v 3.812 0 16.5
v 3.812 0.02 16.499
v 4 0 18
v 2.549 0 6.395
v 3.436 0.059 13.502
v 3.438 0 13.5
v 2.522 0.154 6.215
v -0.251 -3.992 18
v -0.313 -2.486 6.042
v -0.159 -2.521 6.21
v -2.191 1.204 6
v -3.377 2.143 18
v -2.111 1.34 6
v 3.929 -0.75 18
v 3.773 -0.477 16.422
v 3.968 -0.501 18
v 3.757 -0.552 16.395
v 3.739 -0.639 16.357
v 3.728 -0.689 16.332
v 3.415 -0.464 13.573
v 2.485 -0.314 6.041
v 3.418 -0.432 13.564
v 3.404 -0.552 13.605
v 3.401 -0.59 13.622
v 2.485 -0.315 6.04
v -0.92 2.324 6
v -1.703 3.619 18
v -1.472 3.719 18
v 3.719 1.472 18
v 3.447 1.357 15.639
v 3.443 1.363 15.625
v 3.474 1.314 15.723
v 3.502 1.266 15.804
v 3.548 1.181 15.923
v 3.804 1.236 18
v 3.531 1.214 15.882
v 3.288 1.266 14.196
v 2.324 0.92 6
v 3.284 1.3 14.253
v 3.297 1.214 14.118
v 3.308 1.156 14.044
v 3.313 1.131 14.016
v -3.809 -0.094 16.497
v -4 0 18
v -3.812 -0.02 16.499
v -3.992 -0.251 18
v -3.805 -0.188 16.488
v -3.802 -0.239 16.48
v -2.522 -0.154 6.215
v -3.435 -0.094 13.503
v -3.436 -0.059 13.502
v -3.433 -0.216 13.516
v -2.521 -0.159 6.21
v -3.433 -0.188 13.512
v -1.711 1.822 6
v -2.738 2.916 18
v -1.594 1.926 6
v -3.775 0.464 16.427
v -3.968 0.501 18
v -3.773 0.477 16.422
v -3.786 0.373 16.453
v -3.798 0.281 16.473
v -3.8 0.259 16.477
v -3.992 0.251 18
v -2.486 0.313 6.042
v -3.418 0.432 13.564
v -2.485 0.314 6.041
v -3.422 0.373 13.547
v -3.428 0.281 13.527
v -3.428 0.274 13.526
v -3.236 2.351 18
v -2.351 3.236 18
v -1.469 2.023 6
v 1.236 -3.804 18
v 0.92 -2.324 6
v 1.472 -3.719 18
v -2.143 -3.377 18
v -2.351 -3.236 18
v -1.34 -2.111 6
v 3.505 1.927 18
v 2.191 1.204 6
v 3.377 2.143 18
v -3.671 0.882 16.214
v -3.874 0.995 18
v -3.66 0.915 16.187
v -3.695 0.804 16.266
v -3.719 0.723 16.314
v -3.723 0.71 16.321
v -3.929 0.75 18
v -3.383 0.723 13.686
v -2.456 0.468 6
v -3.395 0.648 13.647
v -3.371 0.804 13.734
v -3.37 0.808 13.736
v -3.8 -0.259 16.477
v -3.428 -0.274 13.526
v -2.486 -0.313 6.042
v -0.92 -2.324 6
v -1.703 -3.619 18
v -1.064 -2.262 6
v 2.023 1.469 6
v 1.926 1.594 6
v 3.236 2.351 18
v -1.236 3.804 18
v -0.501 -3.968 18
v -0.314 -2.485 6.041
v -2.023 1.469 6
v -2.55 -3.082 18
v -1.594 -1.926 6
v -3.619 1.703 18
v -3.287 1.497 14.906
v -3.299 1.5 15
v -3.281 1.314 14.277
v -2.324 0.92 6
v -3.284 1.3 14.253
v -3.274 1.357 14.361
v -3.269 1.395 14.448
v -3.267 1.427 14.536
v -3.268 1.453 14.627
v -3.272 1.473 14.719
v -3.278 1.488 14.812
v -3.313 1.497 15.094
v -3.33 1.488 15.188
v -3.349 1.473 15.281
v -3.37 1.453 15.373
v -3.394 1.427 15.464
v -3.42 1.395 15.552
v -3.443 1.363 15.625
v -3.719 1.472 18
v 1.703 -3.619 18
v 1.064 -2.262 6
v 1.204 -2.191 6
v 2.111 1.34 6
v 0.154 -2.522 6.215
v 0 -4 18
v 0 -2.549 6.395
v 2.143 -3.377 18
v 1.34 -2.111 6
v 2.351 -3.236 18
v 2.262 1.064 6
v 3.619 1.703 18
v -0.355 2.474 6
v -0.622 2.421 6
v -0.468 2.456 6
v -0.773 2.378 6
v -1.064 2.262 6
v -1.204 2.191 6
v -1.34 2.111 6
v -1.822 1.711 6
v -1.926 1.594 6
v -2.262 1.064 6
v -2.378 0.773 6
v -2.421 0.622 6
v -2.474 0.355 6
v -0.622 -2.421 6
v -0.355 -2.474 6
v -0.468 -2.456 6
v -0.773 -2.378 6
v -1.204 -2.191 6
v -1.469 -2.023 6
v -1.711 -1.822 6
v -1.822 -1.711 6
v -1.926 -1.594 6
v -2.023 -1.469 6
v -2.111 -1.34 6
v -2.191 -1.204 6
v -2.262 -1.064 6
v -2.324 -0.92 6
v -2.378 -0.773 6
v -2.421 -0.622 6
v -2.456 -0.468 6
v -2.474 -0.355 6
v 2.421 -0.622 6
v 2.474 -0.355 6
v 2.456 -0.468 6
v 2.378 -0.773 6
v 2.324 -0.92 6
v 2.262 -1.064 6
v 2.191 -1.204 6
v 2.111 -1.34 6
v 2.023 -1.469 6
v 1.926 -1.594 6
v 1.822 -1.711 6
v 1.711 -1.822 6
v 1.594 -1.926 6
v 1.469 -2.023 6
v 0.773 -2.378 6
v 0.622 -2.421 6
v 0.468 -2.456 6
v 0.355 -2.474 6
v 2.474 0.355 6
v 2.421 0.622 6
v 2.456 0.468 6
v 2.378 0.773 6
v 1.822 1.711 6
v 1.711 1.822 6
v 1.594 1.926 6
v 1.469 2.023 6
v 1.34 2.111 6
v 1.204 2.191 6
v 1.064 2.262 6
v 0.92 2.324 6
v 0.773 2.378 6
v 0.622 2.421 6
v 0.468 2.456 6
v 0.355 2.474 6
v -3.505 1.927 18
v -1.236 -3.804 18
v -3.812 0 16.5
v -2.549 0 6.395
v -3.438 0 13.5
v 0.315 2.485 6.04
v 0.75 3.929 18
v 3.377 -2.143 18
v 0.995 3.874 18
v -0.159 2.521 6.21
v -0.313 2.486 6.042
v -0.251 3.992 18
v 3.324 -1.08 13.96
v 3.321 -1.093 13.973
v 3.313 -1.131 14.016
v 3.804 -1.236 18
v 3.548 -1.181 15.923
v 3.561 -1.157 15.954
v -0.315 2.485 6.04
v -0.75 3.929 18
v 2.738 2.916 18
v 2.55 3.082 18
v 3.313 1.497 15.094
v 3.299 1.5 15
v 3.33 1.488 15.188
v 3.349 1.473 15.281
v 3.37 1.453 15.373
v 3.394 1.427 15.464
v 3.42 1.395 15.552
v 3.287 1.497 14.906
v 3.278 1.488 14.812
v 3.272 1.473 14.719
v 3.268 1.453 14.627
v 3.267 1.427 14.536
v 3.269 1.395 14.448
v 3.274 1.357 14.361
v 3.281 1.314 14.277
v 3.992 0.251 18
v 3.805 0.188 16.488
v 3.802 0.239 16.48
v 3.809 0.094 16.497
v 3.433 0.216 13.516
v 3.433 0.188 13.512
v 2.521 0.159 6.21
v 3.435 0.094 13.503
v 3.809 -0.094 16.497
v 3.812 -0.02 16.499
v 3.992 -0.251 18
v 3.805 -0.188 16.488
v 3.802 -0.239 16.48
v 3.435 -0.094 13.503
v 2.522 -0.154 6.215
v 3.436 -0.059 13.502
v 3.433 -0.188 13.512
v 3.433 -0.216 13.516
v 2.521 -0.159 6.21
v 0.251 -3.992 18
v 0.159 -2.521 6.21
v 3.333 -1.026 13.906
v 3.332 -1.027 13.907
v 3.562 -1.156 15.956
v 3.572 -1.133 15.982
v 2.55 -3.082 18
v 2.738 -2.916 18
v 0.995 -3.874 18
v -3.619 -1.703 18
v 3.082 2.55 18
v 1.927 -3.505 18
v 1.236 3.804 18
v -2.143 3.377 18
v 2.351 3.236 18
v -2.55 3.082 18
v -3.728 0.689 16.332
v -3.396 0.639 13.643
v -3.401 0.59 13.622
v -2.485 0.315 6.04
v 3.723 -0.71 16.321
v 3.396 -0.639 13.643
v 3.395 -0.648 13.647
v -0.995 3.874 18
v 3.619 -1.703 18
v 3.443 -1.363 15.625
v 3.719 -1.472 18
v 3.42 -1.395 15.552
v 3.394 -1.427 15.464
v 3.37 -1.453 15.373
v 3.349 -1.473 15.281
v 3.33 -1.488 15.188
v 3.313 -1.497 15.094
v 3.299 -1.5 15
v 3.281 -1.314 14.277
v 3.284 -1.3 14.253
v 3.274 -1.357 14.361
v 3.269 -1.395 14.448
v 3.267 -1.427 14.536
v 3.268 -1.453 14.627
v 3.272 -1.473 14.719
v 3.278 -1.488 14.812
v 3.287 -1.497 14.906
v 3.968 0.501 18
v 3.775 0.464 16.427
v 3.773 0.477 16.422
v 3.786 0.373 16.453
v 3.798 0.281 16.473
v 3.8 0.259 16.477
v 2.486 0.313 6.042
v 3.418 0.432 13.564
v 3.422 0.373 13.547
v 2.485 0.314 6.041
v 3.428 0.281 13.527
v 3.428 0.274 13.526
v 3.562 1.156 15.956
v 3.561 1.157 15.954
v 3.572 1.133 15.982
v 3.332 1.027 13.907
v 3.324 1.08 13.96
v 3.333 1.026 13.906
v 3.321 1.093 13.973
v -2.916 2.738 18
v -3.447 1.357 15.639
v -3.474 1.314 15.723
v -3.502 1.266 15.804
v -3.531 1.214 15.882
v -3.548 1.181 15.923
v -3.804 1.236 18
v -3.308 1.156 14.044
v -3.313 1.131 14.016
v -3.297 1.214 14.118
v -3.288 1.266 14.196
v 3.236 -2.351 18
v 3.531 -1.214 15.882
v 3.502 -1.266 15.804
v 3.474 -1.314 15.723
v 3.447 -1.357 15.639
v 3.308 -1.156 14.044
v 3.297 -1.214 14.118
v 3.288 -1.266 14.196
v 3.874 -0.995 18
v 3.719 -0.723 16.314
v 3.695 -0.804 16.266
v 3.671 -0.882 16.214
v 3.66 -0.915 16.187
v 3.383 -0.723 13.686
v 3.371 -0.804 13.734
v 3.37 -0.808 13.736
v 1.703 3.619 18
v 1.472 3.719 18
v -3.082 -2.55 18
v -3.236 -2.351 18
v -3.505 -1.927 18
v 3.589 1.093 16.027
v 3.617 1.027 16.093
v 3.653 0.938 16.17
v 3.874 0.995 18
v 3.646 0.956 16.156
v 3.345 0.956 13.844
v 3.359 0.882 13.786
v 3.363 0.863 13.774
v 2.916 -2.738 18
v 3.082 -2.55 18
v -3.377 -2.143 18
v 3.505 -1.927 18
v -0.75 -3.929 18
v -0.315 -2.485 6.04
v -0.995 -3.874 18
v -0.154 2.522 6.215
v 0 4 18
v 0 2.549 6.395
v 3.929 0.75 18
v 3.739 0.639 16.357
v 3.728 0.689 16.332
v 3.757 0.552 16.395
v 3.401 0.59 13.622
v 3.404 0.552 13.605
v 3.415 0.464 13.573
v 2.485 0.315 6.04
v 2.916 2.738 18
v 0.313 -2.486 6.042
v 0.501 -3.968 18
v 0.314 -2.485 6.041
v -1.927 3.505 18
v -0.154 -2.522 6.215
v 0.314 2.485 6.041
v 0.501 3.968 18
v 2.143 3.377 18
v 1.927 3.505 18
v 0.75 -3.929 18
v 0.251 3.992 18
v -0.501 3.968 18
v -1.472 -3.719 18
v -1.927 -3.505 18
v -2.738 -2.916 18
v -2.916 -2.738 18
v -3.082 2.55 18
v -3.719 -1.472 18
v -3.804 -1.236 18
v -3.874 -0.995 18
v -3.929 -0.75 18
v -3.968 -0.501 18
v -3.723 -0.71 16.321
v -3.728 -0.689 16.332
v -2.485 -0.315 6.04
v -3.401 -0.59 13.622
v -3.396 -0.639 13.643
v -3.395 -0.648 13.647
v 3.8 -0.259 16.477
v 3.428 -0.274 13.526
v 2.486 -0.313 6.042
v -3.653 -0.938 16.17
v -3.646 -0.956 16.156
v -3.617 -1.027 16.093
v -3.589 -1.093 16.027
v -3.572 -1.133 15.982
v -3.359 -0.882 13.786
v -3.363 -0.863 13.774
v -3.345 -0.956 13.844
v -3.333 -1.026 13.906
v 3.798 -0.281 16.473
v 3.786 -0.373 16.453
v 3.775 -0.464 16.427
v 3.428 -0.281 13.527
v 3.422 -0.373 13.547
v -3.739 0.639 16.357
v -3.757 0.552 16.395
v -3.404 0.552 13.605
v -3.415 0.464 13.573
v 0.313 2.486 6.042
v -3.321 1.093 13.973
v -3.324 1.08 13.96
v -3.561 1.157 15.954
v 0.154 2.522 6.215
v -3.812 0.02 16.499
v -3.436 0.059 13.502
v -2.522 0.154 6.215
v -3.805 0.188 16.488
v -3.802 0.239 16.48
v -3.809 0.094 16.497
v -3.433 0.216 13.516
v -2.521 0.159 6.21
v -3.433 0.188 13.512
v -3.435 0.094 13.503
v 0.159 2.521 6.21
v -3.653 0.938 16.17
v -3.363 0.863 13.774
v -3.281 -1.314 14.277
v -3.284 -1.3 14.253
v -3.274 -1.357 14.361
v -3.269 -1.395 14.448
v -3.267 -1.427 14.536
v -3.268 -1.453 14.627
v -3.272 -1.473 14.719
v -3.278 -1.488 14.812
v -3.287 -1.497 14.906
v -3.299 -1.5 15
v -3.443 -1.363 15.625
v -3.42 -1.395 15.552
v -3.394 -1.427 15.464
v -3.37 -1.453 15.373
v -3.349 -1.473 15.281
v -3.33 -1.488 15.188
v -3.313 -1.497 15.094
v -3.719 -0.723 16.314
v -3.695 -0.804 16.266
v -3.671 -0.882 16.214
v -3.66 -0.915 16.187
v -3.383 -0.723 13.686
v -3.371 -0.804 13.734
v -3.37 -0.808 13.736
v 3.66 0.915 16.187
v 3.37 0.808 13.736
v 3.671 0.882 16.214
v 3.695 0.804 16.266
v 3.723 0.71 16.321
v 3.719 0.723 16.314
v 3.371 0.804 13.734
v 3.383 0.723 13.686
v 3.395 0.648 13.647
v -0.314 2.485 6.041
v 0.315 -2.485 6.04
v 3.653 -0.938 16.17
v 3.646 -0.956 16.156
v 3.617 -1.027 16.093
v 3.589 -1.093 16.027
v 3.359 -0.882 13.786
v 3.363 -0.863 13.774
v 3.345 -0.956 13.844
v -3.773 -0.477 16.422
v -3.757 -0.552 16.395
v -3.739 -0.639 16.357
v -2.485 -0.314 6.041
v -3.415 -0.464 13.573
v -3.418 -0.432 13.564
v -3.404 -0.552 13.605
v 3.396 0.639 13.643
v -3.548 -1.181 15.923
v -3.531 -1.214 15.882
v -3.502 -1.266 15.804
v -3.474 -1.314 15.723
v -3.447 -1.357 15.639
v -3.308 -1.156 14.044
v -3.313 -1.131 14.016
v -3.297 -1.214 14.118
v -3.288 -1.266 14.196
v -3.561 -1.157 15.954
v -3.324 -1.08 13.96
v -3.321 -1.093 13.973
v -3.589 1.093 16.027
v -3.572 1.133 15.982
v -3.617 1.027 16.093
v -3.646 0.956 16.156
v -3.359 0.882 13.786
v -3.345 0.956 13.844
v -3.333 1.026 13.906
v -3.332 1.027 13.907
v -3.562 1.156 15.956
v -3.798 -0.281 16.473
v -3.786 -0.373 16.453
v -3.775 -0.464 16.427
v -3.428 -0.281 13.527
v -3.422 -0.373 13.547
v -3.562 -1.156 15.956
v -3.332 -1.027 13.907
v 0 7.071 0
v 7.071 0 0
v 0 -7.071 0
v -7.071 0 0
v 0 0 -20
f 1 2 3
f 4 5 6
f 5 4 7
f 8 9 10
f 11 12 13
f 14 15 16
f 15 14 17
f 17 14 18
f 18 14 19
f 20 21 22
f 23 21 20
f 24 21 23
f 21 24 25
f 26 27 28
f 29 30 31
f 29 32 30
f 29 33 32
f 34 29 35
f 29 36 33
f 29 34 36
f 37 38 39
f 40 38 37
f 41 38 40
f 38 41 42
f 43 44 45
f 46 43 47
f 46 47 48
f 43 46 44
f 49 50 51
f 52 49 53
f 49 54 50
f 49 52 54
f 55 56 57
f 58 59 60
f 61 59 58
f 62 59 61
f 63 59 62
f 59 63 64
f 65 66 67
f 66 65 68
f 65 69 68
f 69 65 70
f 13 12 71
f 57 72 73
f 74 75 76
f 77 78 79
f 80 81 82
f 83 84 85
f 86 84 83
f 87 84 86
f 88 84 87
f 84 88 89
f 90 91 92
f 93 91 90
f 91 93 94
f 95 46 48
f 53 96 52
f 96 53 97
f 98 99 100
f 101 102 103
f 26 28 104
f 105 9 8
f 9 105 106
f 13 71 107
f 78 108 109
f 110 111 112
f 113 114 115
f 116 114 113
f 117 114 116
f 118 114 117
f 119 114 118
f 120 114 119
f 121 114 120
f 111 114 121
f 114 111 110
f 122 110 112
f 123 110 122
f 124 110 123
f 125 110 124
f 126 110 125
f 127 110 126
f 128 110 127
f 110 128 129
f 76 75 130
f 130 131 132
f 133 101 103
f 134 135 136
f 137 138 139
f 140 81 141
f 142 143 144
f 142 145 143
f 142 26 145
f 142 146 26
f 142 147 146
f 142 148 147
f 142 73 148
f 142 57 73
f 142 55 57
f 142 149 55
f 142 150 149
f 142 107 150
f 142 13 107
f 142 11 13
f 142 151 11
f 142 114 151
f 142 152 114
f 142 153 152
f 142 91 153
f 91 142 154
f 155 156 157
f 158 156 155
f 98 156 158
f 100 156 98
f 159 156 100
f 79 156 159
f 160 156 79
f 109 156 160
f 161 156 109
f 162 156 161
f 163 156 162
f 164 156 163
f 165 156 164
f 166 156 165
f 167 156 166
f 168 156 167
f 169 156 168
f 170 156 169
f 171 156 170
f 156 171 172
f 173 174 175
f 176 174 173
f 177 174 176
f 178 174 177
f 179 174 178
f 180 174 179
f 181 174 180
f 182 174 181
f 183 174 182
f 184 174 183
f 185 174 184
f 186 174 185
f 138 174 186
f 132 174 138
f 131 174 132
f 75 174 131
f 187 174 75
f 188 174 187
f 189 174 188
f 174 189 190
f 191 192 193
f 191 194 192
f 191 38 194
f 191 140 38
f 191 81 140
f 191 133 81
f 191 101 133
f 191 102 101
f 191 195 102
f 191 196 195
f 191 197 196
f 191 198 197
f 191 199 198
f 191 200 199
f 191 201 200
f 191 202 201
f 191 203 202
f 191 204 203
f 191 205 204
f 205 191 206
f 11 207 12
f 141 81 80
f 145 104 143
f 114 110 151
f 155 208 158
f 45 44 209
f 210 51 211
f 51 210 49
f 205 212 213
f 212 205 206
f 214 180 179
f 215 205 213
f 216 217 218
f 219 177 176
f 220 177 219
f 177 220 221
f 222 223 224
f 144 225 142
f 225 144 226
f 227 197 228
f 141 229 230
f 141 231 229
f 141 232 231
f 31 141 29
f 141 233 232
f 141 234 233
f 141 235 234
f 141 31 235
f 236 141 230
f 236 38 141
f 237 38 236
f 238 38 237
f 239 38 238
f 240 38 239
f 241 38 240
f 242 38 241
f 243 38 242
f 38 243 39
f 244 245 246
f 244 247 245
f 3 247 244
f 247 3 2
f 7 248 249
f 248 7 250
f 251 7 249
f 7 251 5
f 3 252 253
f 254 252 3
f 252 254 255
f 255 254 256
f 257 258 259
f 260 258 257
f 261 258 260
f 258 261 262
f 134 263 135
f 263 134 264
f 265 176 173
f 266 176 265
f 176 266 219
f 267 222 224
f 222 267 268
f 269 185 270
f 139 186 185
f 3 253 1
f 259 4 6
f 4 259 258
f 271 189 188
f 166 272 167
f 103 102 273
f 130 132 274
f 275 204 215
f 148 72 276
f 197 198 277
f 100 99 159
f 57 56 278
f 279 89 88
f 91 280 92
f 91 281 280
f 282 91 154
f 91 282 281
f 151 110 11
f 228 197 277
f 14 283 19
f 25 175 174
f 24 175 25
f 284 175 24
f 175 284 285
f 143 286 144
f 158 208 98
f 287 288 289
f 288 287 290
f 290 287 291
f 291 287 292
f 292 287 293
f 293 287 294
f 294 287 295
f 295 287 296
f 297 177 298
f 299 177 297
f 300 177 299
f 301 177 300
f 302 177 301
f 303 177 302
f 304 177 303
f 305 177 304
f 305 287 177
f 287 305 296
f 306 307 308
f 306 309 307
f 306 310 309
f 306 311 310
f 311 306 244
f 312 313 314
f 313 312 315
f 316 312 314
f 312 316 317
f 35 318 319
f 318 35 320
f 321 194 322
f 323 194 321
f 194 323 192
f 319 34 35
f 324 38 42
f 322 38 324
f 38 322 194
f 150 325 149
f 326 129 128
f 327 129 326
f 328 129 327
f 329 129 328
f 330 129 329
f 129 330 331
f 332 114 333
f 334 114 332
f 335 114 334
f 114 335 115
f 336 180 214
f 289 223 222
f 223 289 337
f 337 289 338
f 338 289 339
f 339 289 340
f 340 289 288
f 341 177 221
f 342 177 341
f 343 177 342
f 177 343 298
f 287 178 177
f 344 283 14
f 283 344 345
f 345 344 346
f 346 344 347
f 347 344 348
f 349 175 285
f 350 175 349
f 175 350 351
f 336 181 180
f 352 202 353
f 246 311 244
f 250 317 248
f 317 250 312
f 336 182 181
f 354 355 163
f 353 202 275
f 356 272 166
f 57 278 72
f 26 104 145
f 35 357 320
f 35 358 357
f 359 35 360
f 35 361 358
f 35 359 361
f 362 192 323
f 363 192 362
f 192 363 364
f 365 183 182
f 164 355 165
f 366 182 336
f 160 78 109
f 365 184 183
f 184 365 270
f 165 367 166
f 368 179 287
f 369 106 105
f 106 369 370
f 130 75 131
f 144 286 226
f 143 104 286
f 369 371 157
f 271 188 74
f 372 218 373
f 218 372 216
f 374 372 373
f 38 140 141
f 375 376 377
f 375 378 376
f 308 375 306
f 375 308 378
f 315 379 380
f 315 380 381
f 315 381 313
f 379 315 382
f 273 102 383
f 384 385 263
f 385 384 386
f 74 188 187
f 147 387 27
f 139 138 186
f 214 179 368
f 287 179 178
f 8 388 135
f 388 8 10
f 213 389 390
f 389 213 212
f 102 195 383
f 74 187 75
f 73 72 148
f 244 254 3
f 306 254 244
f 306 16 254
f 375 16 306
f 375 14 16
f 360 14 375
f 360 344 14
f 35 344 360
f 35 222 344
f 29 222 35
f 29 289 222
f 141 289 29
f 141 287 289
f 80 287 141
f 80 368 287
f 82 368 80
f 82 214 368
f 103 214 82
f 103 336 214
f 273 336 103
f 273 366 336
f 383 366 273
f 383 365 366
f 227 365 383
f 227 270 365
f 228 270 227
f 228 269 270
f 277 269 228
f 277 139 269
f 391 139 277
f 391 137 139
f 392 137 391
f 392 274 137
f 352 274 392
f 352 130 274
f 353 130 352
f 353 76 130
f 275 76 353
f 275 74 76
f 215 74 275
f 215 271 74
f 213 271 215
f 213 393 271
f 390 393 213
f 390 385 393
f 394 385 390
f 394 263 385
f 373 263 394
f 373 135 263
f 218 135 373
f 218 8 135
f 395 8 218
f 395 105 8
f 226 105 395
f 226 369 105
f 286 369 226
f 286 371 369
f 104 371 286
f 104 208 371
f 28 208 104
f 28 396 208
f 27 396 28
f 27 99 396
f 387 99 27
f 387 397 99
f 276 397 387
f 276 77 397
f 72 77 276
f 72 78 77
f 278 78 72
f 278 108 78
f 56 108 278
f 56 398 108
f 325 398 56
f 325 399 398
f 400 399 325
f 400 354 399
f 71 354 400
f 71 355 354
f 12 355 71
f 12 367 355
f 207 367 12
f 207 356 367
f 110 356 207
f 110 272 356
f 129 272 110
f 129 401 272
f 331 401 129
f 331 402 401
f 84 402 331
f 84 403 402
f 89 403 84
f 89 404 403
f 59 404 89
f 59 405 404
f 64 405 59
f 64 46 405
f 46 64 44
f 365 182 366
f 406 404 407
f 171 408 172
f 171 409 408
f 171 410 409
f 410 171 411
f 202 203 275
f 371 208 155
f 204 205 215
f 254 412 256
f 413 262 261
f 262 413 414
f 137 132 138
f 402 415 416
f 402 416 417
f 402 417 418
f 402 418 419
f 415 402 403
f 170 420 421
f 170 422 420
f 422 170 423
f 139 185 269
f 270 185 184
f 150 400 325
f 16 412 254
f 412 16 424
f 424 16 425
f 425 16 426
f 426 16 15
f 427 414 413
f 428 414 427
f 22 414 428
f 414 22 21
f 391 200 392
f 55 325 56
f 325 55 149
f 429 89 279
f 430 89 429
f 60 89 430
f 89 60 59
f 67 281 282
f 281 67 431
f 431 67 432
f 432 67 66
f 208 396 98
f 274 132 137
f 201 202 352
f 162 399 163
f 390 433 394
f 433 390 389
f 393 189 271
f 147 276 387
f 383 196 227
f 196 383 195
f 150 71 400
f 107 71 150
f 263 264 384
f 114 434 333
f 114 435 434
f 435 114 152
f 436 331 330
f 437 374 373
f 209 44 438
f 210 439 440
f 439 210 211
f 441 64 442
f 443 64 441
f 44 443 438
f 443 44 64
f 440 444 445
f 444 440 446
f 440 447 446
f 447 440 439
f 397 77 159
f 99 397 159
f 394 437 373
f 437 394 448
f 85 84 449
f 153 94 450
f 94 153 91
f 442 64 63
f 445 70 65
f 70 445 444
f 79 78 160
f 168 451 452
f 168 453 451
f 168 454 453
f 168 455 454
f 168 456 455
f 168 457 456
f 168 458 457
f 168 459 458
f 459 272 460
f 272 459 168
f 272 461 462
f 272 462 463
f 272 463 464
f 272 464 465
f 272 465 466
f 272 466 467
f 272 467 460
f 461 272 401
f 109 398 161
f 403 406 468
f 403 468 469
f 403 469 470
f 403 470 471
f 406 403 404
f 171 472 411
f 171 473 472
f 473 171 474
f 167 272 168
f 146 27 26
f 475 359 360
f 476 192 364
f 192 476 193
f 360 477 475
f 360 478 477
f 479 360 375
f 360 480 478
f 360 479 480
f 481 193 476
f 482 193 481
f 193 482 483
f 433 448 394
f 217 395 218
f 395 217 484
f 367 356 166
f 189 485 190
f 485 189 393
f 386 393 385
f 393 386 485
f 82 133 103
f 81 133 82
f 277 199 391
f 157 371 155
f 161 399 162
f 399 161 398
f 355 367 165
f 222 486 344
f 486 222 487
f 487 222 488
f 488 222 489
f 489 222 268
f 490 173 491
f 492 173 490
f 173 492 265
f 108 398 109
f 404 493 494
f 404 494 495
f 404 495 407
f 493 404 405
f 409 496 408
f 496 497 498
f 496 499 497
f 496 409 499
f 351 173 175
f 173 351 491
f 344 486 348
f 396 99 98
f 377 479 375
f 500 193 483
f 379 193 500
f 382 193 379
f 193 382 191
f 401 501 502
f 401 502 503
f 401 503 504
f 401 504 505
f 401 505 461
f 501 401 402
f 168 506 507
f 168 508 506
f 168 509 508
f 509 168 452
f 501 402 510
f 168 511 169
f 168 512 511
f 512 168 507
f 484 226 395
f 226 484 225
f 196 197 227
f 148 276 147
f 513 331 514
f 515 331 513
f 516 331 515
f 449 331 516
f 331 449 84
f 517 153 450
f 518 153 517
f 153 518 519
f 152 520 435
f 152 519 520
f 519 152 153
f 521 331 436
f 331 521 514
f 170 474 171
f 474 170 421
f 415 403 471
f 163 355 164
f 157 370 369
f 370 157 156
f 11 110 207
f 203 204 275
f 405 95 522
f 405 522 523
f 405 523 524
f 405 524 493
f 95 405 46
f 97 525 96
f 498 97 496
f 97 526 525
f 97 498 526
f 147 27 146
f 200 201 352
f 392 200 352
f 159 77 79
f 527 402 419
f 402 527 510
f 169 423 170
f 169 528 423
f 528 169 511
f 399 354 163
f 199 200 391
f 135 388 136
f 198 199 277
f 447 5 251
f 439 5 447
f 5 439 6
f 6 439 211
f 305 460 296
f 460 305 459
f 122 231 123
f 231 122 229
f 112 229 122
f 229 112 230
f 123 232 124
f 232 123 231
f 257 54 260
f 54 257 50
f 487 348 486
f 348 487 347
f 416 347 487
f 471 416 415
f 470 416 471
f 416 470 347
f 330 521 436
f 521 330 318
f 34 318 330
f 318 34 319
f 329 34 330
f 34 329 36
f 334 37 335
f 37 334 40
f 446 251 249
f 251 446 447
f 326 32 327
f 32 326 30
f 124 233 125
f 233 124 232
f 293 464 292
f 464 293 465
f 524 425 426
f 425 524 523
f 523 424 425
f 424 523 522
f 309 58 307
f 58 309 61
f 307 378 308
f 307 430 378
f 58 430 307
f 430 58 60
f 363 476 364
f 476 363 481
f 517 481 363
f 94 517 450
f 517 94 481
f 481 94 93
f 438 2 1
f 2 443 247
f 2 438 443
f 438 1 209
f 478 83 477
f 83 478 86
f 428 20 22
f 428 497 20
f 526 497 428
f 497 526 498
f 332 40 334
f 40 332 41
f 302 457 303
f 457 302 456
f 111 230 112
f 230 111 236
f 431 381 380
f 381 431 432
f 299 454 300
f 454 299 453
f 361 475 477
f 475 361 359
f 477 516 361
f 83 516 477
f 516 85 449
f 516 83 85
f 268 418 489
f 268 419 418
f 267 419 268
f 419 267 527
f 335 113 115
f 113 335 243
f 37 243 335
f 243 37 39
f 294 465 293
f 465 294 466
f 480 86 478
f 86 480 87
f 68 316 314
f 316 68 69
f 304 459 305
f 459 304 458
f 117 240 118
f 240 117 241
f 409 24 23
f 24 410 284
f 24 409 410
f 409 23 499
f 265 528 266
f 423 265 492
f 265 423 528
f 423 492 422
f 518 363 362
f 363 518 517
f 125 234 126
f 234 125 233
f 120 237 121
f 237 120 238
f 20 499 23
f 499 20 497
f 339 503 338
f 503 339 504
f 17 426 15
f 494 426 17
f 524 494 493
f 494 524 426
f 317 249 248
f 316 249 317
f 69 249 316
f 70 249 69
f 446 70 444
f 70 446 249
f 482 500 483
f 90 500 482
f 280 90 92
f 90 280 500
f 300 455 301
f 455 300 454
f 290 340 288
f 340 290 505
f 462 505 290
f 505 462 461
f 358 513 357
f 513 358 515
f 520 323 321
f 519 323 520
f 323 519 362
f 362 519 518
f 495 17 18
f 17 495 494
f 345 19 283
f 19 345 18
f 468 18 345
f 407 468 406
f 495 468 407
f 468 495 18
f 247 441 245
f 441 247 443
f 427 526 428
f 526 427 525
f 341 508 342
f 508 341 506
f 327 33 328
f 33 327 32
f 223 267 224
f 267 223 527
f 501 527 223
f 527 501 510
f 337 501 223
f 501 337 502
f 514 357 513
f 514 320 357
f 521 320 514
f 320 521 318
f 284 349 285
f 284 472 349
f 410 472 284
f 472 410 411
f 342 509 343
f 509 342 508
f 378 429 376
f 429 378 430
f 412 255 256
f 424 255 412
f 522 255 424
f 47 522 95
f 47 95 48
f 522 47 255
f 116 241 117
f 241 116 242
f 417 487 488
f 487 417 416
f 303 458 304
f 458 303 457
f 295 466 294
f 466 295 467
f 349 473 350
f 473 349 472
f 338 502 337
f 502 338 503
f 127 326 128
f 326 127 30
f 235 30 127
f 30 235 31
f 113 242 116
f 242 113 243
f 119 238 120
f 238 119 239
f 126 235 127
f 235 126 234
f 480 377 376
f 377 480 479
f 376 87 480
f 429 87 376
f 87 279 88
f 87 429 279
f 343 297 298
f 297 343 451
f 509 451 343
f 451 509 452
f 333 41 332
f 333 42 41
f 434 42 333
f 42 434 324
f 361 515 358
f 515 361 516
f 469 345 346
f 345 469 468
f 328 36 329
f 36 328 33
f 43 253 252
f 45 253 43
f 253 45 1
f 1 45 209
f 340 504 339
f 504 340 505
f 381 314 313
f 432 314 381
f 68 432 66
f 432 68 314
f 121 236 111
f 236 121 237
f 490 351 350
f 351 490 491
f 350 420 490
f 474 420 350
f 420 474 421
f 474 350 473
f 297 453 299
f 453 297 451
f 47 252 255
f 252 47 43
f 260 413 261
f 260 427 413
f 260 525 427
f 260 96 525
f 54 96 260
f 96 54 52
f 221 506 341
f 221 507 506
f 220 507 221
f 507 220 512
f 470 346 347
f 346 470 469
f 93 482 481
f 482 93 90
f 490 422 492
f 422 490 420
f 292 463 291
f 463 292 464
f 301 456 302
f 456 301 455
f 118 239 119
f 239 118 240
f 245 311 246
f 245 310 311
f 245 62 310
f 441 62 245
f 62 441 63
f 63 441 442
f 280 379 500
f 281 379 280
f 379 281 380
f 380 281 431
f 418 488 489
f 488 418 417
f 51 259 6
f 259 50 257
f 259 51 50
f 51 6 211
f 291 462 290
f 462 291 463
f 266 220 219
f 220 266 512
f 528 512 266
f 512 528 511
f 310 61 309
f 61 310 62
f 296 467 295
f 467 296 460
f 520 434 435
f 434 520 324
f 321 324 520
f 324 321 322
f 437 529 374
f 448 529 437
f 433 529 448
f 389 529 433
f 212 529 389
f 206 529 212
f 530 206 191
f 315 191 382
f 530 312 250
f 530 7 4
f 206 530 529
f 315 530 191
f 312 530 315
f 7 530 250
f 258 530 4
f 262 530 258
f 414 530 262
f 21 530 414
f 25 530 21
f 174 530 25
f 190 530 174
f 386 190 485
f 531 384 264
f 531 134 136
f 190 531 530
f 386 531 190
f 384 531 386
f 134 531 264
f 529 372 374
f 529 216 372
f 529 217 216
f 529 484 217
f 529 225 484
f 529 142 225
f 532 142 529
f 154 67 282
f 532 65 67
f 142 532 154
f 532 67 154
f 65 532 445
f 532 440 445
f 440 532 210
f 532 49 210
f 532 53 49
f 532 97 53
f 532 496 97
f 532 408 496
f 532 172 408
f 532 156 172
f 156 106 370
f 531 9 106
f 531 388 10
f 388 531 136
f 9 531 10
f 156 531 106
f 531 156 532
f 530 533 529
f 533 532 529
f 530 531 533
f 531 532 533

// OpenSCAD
// [FL_INDEX: keywords="openscad, 3d_parametric, Arrow_Head, csg_solid" | COT="Parametric OpenSCAD design from 3DCodeverse"]
// Title: Arrow Head


hole_size = 1.5; //Radius of the hole.
//To make a hole on the top cylinder.
difference() {
   translate([0,0,12])
	cylinder(12,2.5,4, center = true, $fn=100);

	translate([0,0,15]) 
	rotate([90,0,90])
      cylinder (10, hole_size,hole_size, center = true, $fn=100);
}

// 2 Pyramids to complete the model.
// We can do this in a loop with variables, but have kept it simple to be clear.

//1st pyramid for the top part.

apex_point_top_pyramid = 10; //Apex point for top pyramid, which is inside the cylinder.
rotate(a=[0,0,45])
polyhedron(
  points=[ [5,5,0],[5,-5,0],[-5,-5,0],[-5,5,0], // the four points at base
           [0,0,apex_point_top_pyramid]  ],                                 // the apex point 
  triangles=[ [0,1,4],[1,2,4],[2,3,4],[3,0,4],          // each triangle side
              [1,0,3],[2,1,3] ]                         // two triangles for square base
 );


//2nd pyramid for the bottom part.
apex_point_bottom_pyramid = 20;
rotate(a=[180,0,45])
polyhedron(
  points=[ [5,5,0],[5,-5,0],[-5,-5,0],[-5,5,0], // the four points at base
           [0,0,apex_point_bottom_pyramid]  ],                                 // the apex point 
  triangles=[ [0,1,4],[1,2,4],[2,3,4],[3,0,4],          // each triangle side
              [1,0,3],[2,1,3] ]                         // two triangles for square base
 );
